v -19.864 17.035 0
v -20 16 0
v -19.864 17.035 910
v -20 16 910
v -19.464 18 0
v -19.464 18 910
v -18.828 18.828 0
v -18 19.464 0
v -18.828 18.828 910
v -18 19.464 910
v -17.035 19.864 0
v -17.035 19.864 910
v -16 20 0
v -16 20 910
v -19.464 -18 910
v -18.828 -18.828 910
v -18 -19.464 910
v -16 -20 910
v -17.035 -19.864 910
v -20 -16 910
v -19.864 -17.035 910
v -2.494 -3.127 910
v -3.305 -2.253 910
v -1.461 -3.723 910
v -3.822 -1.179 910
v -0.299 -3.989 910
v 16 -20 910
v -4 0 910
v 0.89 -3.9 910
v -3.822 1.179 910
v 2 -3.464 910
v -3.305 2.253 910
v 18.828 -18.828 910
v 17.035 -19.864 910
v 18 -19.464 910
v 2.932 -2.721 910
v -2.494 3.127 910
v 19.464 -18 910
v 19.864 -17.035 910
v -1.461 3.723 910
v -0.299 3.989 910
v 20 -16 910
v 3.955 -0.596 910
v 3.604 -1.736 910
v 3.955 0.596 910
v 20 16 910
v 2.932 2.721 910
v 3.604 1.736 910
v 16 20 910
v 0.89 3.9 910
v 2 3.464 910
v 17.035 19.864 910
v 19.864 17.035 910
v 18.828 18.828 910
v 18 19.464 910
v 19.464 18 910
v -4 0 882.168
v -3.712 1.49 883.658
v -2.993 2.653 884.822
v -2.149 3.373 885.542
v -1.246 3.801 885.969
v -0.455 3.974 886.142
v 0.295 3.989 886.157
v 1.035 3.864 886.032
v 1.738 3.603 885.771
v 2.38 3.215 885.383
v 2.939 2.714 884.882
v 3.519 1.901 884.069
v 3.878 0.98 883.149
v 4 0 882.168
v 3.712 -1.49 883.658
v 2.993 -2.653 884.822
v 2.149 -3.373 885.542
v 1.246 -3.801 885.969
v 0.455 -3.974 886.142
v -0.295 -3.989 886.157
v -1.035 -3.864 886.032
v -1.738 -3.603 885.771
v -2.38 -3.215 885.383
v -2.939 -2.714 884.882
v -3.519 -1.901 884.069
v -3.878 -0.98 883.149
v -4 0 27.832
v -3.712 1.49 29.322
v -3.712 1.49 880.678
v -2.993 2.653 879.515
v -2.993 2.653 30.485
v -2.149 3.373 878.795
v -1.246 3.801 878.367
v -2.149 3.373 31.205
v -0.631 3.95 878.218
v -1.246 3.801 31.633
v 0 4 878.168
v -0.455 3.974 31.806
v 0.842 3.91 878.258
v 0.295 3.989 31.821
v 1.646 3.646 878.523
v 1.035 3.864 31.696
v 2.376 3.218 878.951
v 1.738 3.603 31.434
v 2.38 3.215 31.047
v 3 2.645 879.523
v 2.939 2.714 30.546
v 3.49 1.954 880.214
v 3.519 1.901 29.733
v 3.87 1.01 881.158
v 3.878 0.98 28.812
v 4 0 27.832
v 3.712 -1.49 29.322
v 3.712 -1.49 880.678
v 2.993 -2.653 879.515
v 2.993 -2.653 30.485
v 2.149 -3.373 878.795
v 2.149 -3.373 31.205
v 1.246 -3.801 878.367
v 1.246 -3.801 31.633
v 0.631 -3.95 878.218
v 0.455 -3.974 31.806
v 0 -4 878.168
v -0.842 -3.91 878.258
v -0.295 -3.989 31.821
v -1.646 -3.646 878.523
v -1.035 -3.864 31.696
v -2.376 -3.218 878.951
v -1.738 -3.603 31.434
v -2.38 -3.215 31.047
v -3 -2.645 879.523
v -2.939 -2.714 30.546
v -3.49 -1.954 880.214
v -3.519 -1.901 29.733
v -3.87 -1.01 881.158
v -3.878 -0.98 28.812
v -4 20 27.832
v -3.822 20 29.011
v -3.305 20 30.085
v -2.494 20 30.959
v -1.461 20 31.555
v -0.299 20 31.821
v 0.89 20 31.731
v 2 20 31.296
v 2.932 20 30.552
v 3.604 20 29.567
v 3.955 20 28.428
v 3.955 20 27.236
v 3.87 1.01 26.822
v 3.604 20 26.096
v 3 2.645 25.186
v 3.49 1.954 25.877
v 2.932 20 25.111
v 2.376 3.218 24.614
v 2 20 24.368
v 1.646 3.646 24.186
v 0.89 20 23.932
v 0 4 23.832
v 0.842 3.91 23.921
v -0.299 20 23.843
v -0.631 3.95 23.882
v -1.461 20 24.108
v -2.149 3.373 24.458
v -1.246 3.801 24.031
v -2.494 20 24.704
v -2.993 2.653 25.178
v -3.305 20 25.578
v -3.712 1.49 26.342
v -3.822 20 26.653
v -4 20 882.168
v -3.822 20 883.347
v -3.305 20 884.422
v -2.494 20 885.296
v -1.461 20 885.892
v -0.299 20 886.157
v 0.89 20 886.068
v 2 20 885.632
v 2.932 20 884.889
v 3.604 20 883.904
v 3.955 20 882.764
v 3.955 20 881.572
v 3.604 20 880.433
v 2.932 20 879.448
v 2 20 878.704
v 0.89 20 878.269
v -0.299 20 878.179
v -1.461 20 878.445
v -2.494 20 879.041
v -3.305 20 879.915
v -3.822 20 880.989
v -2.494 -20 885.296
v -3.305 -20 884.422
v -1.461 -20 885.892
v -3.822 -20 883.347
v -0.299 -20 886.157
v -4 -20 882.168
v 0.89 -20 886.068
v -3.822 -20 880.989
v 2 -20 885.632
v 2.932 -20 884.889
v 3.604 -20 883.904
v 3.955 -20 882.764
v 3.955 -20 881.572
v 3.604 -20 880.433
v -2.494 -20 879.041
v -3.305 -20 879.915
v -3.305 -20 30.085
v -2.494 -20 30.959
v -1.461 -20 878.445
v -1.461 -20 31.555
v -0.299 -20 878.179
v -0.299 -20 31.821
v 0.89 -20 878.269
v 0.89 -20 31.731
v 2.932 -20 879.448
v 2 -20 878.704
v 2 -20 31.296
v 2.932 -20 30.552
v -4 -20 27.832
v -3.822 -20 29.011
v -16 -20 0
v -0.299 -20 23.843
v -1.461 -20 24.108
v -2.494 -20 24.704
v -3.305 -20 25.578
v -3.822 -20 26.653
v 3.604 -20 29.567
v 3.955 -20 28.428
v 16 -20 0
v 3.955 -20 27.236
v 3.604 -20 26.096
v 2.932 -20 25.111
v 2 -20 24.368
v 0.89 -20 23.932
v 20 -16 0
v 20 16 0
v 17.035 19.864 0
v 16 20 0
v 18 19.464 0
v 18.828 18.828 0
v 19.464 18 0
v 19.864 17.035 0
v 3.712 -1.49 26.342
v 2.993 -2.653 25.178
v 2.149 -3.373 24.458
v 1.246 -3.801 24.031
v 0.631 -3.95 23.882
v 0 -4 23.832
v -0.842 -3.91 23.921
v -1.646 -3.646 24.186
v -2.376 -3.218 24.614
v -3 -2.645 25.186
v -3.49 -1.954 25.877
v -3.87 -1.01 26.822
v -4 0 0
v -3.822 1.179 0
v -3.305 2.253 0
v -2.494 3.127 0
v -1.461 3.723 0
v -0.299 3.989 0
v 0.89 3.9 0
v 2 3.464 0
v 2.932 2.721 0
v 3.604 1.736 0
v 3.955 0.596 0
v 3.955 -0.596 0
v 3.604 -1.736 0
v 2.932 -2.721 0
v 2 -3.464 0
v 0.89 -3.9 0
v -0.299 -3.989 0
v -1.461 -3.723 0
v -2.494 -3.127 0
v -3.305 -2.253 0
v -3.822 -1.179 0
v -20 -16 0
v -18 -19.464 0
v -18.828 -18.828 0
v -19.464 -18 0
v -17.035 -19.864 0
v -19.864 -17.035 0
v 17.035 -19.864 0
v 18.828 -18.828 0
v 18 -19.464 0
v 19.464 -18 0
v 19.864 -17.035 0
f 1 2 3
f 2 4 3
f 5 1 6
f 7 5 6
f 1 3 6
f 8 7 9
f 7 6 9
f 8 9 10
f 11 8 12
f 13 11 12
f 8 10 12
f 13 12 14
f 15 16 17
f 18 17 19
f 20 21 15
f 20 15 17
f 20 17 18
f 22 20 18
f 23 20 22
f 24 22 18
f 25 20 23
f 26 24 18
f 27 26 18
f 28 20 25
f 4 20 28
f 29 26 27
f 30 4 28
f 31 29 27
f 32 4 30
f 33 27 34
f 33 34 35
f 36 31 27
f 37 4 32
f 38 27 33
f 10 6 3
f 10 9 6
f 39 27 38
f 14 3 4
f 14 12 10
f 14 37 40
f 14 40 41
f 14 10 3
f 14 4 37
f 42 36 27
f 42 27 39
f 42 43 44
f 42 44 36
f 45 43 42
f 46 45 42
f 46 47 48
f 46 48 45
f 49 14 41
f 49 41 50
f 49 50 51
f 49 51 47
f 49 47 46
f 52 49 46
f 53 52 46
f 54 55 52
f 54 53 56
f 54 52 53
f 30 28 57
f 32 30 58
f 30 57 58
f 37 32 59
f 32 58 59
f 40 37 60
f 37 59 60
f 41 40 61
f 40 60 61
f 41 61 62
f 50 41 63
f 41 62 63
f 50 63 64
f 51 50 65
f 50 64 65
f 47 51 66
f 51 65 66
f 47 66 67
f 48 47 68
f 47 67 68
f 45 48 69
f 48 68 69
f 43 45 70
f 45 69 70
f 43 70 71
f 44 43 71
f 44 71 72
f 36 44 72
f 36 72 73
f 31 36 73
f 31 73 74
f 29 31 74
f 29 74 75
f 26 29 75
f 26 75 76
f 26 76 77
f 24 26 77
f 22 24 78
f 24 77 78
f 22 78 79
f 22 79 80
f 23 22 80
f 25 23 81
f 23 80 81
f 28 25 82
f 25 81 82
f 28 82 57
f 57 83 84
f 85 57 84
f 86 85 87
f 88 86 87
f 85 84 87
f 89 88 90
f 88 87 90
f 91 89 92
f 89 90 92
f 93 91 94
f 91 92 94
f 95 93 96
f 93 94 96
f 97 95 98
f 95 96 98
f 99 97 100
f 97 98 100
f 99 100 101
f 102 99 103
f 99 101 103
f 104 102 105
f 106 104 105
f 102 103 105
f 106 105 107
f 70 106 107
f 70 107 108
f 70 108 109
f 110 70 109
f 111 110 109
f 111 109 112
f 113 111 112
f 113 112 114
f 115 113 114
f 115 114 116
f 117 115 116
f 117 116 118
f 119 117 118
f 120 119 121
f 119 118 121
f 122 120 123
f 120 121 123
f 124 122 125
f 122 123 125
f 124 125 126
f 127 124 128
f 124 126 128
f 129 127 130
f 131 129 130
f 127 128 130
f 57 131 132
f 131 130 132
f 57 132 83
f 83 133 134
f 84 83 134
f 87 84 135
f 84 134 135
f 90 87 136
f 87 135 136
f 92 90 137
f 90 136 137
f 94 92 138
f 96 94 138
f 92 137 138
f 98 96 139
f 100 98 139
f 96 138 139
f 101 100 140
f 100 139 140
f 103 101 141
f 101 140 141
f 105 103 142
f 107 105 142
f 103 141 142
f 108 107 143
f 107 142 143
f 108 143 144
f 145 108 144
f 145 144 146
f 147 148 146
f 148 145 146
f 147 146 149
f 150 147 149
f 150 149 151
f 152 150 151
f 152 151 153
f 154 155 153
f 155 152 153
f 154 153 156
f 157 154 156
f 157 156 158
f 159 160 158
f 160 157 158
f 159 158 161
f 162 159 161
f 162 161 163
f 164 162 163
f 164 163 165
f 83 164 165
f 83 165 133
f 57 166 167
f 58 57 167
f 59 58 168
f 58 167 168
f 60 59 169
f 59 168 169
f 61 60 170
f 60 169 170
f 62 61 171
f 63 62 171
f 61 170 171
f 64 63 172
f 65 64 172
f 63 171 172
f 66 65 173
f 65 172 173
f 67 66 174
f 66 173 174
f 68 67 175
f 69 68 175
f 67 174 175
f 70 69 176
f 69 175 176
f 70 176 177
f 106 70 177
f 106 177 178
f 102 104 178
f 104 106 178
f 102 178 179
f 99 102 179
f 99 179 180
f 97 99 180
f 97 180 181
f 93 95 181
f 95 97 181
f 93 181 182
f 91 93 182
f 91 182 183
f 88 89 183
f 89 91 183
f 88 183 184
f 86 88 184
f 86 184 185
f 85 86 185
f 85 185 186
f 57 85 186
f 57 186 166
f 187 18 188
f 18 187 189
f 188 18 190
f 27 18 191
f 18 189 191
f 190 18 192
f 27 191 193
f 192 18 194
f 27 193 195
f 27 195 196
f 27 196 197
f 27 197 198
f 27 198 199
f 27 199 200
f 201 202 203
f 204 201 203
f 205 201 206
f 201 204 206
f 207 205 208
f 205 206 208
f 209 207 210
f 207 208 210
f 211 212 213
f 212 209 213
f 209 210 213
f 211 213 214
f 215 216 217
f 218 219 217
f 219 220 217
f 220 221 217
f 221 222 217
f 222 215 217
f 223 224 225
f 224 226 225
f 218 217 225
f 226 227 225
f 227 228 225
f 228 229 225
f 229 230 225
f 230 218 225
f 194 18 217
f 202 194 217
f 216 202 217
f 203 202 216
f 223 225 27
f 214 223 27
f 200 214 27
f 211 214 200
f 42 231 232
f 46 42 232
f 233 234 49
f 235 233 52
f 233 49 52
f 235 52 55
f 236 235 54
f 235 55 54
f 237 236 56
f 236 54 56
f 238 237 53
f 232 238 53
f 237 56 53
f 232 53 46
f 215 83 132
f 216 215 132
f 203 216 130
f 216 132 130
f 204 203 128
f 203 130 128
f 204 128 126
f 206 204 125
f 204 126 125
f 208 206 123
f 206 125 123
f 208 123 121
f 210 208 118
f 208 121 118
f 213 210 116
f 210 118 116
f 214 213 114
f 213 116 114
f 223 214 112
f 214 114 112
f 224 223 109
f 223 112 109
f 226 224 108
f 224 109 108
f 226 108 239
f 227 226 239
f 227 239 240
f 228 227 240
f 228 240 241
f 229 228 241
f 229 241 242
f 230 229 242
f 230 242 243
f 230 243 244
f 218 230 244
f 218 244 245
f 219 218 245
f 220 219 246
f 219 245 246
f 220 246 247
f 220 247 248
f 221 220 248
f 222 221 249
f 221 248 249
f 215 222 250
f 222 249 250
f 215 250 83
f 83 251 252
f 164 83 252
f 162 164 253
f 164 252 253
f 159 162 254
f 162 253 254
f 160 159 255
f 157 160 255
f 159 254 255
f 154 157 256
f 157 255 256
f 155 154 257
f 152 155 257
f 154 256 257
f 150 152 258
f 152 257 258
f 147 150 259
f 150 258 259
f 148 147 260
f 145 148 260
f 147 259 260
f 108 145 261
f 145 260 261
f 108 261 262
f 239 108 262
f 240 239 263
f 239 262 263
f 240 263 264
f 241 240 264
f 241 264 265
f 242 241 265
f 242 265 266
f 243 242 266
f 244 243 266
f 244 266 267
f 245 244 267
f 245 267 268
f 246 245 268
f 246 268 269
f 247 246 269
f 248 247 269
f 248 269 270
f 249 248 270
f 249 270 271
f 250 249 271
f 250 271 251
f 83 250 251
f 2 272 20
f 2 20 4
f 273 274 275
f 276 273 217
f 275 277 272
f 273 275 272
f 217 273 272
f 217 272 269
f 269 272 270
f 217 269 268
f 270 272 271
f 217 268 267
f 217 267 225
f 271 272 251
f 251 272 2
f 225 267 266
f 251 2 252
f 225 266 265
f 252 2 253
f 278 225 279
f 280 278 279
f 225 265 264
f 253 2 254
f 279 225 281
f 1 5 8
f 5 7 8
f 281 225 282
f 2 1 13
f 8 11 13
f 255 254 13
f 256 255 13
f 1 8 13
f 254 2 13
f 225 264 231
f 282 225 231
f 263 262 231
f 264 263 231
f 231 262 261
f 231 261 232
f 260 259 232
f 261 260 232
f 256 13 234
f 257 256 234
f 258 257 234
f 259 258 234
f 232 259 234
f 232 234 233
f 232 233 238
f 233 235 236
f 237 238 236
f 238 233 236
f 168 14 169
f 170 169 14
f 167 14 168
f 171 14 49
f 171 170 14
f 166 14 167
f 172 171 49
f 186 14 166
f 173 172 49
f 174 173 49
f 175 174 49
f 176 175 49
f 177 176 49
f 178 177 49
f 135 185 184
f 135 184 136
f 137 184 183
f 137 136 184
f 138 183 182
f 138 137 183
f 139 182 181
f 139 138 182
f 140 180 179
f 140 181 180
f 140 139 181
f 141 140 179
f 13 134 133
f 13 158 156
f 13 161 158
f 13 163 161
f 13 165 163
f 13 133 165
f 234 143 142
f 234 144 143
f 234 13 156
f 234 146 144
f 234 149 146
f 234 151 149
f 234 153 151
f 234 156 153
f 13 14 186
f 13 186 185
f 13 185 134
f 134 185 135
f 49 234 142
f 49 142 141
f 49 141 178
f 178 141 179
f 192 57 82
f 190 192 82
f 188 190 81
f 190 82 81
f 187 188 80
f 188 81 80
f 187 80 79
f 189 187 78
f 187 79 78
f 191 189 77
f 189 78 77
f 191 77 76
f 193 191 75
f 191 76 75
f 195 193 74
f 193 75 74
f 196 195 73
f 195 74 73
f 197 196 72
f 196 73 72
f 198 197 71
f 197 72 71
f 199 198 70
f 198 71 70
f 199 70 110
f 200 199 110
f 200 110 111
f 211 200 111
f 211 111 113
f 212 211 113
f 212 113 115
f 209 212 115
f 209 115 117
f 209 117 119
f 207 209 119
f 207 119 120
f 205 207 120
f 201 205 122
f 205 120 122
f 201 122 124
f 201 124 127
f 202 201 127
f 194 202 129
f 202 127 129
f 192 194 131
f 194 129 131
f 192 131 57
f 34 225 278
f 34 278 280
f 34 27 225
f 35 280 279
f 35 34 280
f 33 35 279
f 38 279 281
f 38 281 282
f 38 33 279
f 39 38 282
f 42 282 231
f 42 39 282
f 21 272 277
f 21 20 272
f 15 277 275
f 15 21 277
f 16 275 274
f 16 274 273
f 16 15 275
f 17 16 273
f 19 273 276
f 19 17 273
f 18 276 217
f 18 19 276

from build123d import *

# Parameters (mm, degrees)
F0_W     = 40
F0_H     = 40
F1_DEPTH = 910
F3_D     = 8
F4_R     = 4
F6_D     = 8


with BuildPart() as f1:
    # F0 (on Top) → F1 (new body)
    with BuildSketch(Plane.XY):
        Rectangle(F0_W, F0_H)
    extrude(amount=F1_DEPTH)

    # F3 (through all)
    with Locations(Plane.XY.offset(910)):
        with Locations((0, 0)):
            Hole(F3_D / 2)

    # F4
    f4_edges = [f1.edges().sort_by_distance(p)[0] for p in [
        (-20, -20, 455),
        (20, -20, 455),
        (20, 20, 455),
        (-20, 20, 455),
    ]]
    fillet(f4_edges, radius=F4_R)

    # F6 (through all)
    with Locations(Plane.XZ.offset(20)):
        with Locations((0, 27.83172), (0, 882.16828)):
            Hole(F6_D / 2)


solid = f1.part
